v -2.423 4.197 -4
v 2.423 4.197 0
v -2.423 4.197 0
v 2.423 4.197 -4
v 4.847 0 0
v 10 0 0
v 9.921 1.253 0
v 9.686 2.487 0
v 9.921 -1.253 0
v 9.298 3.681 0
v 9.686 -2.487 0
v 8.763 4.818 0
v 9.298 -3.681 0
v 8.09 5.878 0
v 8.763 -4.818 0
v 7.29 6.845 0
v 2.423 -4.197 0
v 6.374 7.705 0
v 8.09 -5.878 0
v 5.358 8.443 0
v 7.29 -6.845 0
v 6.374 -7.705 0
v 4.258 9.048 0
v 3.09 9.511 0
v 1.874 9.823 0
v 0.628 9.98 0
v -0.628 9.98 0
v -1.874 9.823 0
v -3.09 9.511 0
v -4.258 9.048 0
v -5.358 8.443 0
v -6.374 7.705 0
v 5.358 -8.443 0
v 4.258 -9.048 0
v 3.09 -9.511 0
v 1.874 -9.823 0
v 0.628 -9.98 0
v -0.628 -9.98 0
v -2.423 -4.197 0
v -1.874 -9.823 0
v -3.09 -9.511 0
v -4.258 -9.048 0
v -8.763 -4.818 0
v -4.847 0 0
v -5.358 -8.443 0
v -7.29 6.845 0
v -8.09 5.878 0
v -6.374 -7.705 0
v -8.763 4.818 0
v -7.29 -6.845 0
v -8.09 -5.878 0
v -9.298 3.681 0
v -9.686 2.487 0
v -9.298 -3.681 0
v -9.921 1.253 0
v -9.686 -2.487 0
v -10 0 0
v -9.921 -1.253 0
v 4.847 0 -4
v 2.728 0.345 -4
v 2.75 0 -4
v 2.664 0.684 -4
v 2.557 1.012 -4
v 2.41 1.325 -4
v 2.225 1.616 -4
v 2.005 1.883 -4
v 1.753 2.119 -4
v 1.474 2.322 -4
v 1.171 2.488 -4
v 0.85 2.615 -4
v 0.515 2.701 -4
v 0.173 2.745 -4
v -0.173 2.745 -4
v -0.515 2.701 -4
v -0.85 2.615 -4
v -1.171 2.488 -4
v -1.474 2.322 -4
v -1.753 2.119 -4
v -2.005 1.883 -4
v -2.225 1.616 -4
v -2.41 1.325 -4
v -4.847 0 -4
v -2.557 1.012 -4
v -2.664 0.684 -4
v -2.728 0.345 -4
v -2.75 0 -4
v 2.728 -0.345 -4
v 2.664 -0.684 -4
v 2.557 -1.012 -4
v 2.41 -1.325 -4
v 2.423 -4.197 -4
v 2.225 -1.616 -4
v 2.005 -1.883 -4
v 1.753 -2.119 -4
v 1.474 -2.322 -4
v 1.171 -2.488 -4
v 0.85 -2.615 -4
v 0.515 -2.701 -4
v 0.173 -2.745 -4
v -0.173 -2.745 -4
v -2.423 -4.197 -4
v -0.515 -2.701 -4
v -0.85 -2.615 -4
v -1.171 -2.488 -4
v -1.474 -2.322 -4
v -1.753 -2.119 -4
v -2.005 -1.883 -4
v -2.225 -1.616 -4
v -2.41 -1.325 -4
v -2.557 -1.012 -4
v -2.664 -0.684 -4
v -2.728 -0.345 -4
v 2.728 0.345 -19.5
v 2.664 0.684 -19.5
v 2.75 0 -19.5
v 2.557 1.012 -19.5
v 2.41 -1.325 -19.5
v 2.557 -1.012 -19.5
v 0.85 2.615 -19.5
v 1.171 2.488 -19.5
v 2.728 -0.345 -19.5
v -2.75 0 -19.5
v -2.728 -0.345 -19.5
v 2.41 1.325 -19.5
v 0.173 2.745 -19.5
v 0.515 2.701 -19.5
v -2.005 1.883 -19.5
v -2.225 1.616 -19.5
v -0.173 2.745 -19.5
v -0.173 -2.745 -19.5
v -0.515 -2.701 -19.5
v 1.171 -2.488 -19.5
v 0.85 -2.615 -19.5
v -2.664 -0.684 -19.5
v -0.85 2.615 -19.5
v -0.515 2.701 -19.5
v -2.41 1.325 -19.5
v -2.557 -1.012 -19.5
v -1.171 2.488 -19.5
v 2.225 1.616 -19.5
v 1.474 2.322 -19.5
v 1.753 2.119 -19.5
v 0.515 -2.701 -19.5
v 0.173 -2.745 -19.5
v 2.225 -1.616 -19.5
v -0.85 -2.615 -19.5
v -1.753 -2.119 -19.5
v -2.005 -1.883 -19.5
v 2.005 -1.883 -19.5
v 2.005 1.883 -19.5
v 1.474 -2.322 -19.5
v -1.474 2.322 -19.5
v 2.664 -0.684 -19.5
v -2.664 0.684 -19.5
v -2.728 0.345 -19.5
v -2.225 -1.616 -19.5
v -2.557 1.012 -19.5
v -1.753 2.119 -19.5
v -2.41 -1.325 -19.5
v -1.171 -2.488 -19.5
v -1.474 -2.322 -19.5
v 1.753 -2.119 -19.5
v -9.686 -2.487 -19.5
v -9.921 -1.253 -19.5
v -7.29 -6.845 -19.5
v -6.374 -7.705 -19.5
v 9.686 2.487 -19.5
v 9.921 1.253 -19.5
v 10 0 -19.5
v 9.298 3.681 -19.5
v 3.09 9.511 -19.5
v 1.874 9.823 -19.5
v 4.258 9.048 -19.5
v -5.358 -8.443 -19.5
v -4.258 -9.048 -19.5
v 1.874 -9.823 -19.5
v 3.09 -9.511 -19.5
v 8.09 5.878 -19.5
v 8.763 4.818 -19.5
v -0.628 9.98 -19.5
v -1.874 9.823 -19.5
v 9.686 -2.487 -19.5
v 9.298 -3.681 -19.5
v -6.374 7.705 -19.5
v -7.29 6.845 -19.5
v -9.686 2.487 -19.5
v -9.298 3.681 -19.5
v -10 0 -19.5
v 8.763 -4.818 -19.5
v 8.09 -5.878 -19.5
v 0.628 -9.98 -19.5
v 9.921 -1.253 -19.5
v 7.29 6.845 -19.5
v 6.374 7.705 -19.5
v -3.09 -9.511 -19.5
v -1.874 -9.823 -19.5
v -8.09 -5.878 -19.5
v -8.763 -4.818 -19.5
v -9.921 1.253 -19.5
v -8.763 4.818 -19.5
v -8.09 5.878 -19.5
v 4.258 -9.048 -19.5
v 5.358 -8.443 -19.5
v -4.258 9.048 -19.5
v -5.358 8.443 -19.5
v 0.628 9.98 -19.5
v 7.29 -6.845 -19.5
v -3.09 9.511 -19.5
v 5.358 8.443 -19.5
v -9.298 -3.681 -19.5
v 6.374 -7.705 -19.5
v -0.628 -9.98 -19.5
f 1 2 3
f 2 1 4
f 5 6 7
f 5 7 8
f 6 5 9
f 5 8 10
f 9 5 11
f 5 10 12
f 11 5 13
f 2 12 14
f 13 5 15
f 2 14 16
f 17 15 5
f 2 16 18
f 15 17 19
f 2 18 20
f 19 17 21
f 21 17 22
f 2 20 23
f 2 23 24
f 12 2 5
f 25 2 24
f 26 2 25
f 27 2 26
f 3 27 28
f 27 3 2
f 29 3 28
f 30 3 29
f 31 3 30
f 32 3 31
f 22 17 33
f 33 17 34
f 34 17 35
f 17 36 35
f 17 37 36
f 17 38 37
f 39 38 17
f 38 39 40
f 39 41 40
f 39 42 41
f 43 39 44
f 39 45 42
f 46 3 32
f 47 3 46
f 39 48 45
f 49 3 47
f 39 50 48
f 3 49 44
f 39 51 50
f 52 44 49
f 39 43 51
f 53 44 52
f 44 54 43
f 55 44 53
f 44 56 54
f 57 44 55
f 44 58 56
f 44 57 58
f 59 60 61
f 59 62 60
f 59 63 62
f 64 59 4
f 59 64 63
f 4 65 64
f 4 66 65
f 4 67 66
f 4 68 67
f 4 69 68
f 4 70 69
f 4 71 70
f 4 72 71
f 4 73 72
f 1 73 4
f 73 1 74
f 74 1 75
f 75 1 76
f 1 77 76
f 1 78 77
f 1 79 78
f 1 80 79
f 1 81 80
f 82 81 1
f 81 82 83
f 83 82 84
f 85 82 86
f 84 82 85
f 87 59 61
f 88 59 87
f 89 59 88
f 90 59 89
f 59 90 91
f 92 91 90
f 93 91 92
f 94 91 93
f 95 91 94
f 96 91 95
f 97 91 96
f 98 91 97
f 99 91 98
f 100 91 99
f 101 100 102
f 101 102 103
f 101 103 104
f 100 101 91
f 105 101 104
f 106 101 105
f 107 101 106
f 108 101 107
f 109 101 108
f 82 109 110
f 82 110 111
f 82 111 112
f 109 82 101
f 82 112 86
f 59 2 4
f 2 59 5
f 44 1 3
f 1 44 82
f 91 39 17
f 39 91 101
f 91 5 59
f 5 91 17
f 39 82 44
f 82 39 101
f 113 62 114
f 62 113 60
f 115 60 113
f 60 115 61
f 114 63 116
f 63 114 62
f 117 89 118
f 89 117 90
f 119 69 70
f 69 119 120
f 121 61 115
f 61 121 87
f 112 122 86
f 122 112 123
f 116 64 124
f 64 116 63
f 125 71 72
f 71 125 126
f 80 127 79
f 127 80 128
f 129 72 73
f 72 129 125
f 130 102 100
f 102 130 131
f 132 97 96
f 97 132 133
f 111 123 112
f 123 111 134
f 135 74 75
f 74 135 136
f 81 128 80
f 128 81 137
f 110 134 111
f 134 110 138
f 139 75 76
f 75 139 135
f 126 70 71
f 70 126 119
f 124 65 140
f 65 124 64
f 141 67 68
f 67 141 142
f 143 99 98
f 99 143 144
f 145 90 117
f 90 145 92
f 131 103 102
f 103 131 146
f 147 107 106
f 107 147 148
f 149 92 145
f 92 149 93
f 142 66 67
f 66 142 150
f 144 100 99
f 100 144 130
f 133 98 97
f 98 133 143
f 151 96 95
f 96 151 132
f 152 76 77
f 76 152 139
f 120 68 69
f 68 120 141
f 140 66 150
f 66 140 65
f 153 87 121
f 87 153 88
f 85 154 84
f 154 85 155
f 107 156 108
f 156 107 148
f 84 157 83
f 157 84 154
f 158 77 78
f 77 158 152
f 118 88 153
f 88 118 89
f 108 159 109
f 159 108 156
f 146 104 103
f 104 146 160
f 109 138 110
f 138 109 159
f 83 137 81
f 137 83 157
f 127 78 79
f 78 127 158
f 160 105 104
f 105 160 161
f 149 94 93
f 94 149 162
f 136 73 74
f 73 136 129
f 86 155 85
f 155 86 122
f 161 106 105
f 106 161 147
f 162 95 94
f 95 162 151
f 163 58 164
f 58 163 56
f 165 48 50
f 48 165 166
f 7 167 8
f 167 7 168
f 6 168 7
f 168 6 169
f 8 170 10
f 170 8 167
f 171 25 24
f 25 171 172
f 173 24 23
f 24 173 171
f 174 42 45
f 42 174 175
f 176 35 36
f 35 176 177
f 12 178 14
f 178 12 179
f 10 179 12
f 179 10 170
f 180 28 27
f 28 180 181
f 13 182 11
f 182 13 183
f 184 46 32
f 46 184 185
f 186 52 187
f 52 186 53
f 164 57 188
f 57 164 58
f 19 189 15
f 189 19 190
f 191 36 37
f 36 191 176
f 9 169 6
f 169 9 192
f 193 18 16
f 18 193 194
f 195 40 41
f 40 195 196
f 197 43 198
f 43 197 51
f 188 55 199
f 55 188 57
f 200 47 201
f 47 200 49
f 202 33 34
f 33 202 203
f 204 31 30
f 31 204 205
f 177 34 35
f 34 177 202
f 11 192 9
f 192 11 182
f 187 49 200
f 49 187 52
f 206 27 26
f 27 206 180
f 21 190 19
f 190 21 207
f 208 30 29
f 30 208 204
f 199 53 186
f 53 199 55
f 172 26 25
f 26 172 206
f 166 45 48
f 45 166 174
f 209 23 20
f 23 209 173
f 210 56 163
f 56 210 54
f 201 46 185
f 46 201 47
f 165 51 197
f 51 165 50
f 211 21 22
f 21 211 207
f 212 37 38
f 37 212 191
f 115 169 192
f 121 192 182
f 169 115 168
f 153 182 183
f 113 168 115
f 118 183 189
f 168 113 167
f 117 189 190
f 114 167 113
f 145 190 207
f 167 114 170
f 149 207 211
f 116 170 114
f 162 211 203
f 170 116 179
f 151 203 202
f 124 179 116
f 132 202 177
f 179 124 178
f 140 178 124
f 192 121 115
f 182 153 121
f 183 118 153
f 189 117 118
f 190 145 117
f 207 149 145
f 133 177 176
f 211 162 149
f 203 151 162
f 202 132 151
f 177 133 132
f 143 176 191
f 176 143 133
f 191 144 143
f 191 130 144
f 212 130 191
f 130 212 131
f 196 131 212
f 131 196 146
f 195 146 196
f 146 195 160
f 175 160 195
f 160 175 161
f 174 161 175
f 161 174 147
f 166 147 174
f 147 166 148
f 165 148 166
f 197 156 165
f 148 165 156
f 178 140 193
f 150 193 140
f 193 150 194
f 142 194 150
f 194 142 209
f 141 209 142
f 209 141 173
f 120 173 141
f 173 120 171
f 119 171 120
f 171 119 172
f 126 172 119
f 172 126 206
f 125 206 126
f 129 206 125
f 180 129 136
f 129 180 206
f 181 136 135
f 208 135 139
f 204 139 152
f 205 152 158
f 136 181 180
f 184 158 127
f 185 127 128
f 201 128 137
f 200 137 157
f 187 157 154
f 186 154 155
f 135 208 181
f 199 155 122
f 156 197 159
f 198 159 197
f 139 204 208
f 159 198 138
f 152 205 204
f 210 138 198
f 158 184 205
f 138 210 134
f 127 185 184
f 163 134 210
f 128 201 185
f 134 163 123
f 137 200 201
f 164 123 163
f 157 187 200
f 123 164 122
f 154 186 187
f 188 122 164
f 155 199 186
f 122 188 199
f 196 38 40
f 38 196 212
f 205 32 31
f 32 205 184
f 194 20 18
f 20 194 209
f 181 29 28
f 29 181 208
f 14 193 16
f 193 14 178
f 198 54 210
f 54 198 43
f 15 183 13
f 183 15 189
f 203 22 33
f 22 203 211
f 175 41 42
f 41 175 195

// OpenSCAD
$fn = 50;


difference() {
	union() {
		translate(v = [0, 0, -19.5000000000]) {
			cylinder(h = 19.5000000000, r = 10.0000000000);
		}
	}
	union() {
		translate(v = [0, 0, 0]) {
			rotate(a = [0, 0, 0]) {
				difference() {
					union() {
						translate(v = [0, 0, -4]) {
							linear_extrude(height = 4) {
								polygon(points = [[4.8468000000, 0.0000000000], [2.4234000000, 4.1974519271], [-2.4234000000, 4.1974519271], [-4.8468000000, 0.0000000000], [-2.4234000000, -4.1974519271], [2.4234000000, -4.1974519271]]);
							}
						}
					}
					union();
				}
			}
		}
		#translate(v = [0, 0, -100.0000000000]) {
			cylinder(h = 200, r = 2.7500000000);
		}
	}
}
